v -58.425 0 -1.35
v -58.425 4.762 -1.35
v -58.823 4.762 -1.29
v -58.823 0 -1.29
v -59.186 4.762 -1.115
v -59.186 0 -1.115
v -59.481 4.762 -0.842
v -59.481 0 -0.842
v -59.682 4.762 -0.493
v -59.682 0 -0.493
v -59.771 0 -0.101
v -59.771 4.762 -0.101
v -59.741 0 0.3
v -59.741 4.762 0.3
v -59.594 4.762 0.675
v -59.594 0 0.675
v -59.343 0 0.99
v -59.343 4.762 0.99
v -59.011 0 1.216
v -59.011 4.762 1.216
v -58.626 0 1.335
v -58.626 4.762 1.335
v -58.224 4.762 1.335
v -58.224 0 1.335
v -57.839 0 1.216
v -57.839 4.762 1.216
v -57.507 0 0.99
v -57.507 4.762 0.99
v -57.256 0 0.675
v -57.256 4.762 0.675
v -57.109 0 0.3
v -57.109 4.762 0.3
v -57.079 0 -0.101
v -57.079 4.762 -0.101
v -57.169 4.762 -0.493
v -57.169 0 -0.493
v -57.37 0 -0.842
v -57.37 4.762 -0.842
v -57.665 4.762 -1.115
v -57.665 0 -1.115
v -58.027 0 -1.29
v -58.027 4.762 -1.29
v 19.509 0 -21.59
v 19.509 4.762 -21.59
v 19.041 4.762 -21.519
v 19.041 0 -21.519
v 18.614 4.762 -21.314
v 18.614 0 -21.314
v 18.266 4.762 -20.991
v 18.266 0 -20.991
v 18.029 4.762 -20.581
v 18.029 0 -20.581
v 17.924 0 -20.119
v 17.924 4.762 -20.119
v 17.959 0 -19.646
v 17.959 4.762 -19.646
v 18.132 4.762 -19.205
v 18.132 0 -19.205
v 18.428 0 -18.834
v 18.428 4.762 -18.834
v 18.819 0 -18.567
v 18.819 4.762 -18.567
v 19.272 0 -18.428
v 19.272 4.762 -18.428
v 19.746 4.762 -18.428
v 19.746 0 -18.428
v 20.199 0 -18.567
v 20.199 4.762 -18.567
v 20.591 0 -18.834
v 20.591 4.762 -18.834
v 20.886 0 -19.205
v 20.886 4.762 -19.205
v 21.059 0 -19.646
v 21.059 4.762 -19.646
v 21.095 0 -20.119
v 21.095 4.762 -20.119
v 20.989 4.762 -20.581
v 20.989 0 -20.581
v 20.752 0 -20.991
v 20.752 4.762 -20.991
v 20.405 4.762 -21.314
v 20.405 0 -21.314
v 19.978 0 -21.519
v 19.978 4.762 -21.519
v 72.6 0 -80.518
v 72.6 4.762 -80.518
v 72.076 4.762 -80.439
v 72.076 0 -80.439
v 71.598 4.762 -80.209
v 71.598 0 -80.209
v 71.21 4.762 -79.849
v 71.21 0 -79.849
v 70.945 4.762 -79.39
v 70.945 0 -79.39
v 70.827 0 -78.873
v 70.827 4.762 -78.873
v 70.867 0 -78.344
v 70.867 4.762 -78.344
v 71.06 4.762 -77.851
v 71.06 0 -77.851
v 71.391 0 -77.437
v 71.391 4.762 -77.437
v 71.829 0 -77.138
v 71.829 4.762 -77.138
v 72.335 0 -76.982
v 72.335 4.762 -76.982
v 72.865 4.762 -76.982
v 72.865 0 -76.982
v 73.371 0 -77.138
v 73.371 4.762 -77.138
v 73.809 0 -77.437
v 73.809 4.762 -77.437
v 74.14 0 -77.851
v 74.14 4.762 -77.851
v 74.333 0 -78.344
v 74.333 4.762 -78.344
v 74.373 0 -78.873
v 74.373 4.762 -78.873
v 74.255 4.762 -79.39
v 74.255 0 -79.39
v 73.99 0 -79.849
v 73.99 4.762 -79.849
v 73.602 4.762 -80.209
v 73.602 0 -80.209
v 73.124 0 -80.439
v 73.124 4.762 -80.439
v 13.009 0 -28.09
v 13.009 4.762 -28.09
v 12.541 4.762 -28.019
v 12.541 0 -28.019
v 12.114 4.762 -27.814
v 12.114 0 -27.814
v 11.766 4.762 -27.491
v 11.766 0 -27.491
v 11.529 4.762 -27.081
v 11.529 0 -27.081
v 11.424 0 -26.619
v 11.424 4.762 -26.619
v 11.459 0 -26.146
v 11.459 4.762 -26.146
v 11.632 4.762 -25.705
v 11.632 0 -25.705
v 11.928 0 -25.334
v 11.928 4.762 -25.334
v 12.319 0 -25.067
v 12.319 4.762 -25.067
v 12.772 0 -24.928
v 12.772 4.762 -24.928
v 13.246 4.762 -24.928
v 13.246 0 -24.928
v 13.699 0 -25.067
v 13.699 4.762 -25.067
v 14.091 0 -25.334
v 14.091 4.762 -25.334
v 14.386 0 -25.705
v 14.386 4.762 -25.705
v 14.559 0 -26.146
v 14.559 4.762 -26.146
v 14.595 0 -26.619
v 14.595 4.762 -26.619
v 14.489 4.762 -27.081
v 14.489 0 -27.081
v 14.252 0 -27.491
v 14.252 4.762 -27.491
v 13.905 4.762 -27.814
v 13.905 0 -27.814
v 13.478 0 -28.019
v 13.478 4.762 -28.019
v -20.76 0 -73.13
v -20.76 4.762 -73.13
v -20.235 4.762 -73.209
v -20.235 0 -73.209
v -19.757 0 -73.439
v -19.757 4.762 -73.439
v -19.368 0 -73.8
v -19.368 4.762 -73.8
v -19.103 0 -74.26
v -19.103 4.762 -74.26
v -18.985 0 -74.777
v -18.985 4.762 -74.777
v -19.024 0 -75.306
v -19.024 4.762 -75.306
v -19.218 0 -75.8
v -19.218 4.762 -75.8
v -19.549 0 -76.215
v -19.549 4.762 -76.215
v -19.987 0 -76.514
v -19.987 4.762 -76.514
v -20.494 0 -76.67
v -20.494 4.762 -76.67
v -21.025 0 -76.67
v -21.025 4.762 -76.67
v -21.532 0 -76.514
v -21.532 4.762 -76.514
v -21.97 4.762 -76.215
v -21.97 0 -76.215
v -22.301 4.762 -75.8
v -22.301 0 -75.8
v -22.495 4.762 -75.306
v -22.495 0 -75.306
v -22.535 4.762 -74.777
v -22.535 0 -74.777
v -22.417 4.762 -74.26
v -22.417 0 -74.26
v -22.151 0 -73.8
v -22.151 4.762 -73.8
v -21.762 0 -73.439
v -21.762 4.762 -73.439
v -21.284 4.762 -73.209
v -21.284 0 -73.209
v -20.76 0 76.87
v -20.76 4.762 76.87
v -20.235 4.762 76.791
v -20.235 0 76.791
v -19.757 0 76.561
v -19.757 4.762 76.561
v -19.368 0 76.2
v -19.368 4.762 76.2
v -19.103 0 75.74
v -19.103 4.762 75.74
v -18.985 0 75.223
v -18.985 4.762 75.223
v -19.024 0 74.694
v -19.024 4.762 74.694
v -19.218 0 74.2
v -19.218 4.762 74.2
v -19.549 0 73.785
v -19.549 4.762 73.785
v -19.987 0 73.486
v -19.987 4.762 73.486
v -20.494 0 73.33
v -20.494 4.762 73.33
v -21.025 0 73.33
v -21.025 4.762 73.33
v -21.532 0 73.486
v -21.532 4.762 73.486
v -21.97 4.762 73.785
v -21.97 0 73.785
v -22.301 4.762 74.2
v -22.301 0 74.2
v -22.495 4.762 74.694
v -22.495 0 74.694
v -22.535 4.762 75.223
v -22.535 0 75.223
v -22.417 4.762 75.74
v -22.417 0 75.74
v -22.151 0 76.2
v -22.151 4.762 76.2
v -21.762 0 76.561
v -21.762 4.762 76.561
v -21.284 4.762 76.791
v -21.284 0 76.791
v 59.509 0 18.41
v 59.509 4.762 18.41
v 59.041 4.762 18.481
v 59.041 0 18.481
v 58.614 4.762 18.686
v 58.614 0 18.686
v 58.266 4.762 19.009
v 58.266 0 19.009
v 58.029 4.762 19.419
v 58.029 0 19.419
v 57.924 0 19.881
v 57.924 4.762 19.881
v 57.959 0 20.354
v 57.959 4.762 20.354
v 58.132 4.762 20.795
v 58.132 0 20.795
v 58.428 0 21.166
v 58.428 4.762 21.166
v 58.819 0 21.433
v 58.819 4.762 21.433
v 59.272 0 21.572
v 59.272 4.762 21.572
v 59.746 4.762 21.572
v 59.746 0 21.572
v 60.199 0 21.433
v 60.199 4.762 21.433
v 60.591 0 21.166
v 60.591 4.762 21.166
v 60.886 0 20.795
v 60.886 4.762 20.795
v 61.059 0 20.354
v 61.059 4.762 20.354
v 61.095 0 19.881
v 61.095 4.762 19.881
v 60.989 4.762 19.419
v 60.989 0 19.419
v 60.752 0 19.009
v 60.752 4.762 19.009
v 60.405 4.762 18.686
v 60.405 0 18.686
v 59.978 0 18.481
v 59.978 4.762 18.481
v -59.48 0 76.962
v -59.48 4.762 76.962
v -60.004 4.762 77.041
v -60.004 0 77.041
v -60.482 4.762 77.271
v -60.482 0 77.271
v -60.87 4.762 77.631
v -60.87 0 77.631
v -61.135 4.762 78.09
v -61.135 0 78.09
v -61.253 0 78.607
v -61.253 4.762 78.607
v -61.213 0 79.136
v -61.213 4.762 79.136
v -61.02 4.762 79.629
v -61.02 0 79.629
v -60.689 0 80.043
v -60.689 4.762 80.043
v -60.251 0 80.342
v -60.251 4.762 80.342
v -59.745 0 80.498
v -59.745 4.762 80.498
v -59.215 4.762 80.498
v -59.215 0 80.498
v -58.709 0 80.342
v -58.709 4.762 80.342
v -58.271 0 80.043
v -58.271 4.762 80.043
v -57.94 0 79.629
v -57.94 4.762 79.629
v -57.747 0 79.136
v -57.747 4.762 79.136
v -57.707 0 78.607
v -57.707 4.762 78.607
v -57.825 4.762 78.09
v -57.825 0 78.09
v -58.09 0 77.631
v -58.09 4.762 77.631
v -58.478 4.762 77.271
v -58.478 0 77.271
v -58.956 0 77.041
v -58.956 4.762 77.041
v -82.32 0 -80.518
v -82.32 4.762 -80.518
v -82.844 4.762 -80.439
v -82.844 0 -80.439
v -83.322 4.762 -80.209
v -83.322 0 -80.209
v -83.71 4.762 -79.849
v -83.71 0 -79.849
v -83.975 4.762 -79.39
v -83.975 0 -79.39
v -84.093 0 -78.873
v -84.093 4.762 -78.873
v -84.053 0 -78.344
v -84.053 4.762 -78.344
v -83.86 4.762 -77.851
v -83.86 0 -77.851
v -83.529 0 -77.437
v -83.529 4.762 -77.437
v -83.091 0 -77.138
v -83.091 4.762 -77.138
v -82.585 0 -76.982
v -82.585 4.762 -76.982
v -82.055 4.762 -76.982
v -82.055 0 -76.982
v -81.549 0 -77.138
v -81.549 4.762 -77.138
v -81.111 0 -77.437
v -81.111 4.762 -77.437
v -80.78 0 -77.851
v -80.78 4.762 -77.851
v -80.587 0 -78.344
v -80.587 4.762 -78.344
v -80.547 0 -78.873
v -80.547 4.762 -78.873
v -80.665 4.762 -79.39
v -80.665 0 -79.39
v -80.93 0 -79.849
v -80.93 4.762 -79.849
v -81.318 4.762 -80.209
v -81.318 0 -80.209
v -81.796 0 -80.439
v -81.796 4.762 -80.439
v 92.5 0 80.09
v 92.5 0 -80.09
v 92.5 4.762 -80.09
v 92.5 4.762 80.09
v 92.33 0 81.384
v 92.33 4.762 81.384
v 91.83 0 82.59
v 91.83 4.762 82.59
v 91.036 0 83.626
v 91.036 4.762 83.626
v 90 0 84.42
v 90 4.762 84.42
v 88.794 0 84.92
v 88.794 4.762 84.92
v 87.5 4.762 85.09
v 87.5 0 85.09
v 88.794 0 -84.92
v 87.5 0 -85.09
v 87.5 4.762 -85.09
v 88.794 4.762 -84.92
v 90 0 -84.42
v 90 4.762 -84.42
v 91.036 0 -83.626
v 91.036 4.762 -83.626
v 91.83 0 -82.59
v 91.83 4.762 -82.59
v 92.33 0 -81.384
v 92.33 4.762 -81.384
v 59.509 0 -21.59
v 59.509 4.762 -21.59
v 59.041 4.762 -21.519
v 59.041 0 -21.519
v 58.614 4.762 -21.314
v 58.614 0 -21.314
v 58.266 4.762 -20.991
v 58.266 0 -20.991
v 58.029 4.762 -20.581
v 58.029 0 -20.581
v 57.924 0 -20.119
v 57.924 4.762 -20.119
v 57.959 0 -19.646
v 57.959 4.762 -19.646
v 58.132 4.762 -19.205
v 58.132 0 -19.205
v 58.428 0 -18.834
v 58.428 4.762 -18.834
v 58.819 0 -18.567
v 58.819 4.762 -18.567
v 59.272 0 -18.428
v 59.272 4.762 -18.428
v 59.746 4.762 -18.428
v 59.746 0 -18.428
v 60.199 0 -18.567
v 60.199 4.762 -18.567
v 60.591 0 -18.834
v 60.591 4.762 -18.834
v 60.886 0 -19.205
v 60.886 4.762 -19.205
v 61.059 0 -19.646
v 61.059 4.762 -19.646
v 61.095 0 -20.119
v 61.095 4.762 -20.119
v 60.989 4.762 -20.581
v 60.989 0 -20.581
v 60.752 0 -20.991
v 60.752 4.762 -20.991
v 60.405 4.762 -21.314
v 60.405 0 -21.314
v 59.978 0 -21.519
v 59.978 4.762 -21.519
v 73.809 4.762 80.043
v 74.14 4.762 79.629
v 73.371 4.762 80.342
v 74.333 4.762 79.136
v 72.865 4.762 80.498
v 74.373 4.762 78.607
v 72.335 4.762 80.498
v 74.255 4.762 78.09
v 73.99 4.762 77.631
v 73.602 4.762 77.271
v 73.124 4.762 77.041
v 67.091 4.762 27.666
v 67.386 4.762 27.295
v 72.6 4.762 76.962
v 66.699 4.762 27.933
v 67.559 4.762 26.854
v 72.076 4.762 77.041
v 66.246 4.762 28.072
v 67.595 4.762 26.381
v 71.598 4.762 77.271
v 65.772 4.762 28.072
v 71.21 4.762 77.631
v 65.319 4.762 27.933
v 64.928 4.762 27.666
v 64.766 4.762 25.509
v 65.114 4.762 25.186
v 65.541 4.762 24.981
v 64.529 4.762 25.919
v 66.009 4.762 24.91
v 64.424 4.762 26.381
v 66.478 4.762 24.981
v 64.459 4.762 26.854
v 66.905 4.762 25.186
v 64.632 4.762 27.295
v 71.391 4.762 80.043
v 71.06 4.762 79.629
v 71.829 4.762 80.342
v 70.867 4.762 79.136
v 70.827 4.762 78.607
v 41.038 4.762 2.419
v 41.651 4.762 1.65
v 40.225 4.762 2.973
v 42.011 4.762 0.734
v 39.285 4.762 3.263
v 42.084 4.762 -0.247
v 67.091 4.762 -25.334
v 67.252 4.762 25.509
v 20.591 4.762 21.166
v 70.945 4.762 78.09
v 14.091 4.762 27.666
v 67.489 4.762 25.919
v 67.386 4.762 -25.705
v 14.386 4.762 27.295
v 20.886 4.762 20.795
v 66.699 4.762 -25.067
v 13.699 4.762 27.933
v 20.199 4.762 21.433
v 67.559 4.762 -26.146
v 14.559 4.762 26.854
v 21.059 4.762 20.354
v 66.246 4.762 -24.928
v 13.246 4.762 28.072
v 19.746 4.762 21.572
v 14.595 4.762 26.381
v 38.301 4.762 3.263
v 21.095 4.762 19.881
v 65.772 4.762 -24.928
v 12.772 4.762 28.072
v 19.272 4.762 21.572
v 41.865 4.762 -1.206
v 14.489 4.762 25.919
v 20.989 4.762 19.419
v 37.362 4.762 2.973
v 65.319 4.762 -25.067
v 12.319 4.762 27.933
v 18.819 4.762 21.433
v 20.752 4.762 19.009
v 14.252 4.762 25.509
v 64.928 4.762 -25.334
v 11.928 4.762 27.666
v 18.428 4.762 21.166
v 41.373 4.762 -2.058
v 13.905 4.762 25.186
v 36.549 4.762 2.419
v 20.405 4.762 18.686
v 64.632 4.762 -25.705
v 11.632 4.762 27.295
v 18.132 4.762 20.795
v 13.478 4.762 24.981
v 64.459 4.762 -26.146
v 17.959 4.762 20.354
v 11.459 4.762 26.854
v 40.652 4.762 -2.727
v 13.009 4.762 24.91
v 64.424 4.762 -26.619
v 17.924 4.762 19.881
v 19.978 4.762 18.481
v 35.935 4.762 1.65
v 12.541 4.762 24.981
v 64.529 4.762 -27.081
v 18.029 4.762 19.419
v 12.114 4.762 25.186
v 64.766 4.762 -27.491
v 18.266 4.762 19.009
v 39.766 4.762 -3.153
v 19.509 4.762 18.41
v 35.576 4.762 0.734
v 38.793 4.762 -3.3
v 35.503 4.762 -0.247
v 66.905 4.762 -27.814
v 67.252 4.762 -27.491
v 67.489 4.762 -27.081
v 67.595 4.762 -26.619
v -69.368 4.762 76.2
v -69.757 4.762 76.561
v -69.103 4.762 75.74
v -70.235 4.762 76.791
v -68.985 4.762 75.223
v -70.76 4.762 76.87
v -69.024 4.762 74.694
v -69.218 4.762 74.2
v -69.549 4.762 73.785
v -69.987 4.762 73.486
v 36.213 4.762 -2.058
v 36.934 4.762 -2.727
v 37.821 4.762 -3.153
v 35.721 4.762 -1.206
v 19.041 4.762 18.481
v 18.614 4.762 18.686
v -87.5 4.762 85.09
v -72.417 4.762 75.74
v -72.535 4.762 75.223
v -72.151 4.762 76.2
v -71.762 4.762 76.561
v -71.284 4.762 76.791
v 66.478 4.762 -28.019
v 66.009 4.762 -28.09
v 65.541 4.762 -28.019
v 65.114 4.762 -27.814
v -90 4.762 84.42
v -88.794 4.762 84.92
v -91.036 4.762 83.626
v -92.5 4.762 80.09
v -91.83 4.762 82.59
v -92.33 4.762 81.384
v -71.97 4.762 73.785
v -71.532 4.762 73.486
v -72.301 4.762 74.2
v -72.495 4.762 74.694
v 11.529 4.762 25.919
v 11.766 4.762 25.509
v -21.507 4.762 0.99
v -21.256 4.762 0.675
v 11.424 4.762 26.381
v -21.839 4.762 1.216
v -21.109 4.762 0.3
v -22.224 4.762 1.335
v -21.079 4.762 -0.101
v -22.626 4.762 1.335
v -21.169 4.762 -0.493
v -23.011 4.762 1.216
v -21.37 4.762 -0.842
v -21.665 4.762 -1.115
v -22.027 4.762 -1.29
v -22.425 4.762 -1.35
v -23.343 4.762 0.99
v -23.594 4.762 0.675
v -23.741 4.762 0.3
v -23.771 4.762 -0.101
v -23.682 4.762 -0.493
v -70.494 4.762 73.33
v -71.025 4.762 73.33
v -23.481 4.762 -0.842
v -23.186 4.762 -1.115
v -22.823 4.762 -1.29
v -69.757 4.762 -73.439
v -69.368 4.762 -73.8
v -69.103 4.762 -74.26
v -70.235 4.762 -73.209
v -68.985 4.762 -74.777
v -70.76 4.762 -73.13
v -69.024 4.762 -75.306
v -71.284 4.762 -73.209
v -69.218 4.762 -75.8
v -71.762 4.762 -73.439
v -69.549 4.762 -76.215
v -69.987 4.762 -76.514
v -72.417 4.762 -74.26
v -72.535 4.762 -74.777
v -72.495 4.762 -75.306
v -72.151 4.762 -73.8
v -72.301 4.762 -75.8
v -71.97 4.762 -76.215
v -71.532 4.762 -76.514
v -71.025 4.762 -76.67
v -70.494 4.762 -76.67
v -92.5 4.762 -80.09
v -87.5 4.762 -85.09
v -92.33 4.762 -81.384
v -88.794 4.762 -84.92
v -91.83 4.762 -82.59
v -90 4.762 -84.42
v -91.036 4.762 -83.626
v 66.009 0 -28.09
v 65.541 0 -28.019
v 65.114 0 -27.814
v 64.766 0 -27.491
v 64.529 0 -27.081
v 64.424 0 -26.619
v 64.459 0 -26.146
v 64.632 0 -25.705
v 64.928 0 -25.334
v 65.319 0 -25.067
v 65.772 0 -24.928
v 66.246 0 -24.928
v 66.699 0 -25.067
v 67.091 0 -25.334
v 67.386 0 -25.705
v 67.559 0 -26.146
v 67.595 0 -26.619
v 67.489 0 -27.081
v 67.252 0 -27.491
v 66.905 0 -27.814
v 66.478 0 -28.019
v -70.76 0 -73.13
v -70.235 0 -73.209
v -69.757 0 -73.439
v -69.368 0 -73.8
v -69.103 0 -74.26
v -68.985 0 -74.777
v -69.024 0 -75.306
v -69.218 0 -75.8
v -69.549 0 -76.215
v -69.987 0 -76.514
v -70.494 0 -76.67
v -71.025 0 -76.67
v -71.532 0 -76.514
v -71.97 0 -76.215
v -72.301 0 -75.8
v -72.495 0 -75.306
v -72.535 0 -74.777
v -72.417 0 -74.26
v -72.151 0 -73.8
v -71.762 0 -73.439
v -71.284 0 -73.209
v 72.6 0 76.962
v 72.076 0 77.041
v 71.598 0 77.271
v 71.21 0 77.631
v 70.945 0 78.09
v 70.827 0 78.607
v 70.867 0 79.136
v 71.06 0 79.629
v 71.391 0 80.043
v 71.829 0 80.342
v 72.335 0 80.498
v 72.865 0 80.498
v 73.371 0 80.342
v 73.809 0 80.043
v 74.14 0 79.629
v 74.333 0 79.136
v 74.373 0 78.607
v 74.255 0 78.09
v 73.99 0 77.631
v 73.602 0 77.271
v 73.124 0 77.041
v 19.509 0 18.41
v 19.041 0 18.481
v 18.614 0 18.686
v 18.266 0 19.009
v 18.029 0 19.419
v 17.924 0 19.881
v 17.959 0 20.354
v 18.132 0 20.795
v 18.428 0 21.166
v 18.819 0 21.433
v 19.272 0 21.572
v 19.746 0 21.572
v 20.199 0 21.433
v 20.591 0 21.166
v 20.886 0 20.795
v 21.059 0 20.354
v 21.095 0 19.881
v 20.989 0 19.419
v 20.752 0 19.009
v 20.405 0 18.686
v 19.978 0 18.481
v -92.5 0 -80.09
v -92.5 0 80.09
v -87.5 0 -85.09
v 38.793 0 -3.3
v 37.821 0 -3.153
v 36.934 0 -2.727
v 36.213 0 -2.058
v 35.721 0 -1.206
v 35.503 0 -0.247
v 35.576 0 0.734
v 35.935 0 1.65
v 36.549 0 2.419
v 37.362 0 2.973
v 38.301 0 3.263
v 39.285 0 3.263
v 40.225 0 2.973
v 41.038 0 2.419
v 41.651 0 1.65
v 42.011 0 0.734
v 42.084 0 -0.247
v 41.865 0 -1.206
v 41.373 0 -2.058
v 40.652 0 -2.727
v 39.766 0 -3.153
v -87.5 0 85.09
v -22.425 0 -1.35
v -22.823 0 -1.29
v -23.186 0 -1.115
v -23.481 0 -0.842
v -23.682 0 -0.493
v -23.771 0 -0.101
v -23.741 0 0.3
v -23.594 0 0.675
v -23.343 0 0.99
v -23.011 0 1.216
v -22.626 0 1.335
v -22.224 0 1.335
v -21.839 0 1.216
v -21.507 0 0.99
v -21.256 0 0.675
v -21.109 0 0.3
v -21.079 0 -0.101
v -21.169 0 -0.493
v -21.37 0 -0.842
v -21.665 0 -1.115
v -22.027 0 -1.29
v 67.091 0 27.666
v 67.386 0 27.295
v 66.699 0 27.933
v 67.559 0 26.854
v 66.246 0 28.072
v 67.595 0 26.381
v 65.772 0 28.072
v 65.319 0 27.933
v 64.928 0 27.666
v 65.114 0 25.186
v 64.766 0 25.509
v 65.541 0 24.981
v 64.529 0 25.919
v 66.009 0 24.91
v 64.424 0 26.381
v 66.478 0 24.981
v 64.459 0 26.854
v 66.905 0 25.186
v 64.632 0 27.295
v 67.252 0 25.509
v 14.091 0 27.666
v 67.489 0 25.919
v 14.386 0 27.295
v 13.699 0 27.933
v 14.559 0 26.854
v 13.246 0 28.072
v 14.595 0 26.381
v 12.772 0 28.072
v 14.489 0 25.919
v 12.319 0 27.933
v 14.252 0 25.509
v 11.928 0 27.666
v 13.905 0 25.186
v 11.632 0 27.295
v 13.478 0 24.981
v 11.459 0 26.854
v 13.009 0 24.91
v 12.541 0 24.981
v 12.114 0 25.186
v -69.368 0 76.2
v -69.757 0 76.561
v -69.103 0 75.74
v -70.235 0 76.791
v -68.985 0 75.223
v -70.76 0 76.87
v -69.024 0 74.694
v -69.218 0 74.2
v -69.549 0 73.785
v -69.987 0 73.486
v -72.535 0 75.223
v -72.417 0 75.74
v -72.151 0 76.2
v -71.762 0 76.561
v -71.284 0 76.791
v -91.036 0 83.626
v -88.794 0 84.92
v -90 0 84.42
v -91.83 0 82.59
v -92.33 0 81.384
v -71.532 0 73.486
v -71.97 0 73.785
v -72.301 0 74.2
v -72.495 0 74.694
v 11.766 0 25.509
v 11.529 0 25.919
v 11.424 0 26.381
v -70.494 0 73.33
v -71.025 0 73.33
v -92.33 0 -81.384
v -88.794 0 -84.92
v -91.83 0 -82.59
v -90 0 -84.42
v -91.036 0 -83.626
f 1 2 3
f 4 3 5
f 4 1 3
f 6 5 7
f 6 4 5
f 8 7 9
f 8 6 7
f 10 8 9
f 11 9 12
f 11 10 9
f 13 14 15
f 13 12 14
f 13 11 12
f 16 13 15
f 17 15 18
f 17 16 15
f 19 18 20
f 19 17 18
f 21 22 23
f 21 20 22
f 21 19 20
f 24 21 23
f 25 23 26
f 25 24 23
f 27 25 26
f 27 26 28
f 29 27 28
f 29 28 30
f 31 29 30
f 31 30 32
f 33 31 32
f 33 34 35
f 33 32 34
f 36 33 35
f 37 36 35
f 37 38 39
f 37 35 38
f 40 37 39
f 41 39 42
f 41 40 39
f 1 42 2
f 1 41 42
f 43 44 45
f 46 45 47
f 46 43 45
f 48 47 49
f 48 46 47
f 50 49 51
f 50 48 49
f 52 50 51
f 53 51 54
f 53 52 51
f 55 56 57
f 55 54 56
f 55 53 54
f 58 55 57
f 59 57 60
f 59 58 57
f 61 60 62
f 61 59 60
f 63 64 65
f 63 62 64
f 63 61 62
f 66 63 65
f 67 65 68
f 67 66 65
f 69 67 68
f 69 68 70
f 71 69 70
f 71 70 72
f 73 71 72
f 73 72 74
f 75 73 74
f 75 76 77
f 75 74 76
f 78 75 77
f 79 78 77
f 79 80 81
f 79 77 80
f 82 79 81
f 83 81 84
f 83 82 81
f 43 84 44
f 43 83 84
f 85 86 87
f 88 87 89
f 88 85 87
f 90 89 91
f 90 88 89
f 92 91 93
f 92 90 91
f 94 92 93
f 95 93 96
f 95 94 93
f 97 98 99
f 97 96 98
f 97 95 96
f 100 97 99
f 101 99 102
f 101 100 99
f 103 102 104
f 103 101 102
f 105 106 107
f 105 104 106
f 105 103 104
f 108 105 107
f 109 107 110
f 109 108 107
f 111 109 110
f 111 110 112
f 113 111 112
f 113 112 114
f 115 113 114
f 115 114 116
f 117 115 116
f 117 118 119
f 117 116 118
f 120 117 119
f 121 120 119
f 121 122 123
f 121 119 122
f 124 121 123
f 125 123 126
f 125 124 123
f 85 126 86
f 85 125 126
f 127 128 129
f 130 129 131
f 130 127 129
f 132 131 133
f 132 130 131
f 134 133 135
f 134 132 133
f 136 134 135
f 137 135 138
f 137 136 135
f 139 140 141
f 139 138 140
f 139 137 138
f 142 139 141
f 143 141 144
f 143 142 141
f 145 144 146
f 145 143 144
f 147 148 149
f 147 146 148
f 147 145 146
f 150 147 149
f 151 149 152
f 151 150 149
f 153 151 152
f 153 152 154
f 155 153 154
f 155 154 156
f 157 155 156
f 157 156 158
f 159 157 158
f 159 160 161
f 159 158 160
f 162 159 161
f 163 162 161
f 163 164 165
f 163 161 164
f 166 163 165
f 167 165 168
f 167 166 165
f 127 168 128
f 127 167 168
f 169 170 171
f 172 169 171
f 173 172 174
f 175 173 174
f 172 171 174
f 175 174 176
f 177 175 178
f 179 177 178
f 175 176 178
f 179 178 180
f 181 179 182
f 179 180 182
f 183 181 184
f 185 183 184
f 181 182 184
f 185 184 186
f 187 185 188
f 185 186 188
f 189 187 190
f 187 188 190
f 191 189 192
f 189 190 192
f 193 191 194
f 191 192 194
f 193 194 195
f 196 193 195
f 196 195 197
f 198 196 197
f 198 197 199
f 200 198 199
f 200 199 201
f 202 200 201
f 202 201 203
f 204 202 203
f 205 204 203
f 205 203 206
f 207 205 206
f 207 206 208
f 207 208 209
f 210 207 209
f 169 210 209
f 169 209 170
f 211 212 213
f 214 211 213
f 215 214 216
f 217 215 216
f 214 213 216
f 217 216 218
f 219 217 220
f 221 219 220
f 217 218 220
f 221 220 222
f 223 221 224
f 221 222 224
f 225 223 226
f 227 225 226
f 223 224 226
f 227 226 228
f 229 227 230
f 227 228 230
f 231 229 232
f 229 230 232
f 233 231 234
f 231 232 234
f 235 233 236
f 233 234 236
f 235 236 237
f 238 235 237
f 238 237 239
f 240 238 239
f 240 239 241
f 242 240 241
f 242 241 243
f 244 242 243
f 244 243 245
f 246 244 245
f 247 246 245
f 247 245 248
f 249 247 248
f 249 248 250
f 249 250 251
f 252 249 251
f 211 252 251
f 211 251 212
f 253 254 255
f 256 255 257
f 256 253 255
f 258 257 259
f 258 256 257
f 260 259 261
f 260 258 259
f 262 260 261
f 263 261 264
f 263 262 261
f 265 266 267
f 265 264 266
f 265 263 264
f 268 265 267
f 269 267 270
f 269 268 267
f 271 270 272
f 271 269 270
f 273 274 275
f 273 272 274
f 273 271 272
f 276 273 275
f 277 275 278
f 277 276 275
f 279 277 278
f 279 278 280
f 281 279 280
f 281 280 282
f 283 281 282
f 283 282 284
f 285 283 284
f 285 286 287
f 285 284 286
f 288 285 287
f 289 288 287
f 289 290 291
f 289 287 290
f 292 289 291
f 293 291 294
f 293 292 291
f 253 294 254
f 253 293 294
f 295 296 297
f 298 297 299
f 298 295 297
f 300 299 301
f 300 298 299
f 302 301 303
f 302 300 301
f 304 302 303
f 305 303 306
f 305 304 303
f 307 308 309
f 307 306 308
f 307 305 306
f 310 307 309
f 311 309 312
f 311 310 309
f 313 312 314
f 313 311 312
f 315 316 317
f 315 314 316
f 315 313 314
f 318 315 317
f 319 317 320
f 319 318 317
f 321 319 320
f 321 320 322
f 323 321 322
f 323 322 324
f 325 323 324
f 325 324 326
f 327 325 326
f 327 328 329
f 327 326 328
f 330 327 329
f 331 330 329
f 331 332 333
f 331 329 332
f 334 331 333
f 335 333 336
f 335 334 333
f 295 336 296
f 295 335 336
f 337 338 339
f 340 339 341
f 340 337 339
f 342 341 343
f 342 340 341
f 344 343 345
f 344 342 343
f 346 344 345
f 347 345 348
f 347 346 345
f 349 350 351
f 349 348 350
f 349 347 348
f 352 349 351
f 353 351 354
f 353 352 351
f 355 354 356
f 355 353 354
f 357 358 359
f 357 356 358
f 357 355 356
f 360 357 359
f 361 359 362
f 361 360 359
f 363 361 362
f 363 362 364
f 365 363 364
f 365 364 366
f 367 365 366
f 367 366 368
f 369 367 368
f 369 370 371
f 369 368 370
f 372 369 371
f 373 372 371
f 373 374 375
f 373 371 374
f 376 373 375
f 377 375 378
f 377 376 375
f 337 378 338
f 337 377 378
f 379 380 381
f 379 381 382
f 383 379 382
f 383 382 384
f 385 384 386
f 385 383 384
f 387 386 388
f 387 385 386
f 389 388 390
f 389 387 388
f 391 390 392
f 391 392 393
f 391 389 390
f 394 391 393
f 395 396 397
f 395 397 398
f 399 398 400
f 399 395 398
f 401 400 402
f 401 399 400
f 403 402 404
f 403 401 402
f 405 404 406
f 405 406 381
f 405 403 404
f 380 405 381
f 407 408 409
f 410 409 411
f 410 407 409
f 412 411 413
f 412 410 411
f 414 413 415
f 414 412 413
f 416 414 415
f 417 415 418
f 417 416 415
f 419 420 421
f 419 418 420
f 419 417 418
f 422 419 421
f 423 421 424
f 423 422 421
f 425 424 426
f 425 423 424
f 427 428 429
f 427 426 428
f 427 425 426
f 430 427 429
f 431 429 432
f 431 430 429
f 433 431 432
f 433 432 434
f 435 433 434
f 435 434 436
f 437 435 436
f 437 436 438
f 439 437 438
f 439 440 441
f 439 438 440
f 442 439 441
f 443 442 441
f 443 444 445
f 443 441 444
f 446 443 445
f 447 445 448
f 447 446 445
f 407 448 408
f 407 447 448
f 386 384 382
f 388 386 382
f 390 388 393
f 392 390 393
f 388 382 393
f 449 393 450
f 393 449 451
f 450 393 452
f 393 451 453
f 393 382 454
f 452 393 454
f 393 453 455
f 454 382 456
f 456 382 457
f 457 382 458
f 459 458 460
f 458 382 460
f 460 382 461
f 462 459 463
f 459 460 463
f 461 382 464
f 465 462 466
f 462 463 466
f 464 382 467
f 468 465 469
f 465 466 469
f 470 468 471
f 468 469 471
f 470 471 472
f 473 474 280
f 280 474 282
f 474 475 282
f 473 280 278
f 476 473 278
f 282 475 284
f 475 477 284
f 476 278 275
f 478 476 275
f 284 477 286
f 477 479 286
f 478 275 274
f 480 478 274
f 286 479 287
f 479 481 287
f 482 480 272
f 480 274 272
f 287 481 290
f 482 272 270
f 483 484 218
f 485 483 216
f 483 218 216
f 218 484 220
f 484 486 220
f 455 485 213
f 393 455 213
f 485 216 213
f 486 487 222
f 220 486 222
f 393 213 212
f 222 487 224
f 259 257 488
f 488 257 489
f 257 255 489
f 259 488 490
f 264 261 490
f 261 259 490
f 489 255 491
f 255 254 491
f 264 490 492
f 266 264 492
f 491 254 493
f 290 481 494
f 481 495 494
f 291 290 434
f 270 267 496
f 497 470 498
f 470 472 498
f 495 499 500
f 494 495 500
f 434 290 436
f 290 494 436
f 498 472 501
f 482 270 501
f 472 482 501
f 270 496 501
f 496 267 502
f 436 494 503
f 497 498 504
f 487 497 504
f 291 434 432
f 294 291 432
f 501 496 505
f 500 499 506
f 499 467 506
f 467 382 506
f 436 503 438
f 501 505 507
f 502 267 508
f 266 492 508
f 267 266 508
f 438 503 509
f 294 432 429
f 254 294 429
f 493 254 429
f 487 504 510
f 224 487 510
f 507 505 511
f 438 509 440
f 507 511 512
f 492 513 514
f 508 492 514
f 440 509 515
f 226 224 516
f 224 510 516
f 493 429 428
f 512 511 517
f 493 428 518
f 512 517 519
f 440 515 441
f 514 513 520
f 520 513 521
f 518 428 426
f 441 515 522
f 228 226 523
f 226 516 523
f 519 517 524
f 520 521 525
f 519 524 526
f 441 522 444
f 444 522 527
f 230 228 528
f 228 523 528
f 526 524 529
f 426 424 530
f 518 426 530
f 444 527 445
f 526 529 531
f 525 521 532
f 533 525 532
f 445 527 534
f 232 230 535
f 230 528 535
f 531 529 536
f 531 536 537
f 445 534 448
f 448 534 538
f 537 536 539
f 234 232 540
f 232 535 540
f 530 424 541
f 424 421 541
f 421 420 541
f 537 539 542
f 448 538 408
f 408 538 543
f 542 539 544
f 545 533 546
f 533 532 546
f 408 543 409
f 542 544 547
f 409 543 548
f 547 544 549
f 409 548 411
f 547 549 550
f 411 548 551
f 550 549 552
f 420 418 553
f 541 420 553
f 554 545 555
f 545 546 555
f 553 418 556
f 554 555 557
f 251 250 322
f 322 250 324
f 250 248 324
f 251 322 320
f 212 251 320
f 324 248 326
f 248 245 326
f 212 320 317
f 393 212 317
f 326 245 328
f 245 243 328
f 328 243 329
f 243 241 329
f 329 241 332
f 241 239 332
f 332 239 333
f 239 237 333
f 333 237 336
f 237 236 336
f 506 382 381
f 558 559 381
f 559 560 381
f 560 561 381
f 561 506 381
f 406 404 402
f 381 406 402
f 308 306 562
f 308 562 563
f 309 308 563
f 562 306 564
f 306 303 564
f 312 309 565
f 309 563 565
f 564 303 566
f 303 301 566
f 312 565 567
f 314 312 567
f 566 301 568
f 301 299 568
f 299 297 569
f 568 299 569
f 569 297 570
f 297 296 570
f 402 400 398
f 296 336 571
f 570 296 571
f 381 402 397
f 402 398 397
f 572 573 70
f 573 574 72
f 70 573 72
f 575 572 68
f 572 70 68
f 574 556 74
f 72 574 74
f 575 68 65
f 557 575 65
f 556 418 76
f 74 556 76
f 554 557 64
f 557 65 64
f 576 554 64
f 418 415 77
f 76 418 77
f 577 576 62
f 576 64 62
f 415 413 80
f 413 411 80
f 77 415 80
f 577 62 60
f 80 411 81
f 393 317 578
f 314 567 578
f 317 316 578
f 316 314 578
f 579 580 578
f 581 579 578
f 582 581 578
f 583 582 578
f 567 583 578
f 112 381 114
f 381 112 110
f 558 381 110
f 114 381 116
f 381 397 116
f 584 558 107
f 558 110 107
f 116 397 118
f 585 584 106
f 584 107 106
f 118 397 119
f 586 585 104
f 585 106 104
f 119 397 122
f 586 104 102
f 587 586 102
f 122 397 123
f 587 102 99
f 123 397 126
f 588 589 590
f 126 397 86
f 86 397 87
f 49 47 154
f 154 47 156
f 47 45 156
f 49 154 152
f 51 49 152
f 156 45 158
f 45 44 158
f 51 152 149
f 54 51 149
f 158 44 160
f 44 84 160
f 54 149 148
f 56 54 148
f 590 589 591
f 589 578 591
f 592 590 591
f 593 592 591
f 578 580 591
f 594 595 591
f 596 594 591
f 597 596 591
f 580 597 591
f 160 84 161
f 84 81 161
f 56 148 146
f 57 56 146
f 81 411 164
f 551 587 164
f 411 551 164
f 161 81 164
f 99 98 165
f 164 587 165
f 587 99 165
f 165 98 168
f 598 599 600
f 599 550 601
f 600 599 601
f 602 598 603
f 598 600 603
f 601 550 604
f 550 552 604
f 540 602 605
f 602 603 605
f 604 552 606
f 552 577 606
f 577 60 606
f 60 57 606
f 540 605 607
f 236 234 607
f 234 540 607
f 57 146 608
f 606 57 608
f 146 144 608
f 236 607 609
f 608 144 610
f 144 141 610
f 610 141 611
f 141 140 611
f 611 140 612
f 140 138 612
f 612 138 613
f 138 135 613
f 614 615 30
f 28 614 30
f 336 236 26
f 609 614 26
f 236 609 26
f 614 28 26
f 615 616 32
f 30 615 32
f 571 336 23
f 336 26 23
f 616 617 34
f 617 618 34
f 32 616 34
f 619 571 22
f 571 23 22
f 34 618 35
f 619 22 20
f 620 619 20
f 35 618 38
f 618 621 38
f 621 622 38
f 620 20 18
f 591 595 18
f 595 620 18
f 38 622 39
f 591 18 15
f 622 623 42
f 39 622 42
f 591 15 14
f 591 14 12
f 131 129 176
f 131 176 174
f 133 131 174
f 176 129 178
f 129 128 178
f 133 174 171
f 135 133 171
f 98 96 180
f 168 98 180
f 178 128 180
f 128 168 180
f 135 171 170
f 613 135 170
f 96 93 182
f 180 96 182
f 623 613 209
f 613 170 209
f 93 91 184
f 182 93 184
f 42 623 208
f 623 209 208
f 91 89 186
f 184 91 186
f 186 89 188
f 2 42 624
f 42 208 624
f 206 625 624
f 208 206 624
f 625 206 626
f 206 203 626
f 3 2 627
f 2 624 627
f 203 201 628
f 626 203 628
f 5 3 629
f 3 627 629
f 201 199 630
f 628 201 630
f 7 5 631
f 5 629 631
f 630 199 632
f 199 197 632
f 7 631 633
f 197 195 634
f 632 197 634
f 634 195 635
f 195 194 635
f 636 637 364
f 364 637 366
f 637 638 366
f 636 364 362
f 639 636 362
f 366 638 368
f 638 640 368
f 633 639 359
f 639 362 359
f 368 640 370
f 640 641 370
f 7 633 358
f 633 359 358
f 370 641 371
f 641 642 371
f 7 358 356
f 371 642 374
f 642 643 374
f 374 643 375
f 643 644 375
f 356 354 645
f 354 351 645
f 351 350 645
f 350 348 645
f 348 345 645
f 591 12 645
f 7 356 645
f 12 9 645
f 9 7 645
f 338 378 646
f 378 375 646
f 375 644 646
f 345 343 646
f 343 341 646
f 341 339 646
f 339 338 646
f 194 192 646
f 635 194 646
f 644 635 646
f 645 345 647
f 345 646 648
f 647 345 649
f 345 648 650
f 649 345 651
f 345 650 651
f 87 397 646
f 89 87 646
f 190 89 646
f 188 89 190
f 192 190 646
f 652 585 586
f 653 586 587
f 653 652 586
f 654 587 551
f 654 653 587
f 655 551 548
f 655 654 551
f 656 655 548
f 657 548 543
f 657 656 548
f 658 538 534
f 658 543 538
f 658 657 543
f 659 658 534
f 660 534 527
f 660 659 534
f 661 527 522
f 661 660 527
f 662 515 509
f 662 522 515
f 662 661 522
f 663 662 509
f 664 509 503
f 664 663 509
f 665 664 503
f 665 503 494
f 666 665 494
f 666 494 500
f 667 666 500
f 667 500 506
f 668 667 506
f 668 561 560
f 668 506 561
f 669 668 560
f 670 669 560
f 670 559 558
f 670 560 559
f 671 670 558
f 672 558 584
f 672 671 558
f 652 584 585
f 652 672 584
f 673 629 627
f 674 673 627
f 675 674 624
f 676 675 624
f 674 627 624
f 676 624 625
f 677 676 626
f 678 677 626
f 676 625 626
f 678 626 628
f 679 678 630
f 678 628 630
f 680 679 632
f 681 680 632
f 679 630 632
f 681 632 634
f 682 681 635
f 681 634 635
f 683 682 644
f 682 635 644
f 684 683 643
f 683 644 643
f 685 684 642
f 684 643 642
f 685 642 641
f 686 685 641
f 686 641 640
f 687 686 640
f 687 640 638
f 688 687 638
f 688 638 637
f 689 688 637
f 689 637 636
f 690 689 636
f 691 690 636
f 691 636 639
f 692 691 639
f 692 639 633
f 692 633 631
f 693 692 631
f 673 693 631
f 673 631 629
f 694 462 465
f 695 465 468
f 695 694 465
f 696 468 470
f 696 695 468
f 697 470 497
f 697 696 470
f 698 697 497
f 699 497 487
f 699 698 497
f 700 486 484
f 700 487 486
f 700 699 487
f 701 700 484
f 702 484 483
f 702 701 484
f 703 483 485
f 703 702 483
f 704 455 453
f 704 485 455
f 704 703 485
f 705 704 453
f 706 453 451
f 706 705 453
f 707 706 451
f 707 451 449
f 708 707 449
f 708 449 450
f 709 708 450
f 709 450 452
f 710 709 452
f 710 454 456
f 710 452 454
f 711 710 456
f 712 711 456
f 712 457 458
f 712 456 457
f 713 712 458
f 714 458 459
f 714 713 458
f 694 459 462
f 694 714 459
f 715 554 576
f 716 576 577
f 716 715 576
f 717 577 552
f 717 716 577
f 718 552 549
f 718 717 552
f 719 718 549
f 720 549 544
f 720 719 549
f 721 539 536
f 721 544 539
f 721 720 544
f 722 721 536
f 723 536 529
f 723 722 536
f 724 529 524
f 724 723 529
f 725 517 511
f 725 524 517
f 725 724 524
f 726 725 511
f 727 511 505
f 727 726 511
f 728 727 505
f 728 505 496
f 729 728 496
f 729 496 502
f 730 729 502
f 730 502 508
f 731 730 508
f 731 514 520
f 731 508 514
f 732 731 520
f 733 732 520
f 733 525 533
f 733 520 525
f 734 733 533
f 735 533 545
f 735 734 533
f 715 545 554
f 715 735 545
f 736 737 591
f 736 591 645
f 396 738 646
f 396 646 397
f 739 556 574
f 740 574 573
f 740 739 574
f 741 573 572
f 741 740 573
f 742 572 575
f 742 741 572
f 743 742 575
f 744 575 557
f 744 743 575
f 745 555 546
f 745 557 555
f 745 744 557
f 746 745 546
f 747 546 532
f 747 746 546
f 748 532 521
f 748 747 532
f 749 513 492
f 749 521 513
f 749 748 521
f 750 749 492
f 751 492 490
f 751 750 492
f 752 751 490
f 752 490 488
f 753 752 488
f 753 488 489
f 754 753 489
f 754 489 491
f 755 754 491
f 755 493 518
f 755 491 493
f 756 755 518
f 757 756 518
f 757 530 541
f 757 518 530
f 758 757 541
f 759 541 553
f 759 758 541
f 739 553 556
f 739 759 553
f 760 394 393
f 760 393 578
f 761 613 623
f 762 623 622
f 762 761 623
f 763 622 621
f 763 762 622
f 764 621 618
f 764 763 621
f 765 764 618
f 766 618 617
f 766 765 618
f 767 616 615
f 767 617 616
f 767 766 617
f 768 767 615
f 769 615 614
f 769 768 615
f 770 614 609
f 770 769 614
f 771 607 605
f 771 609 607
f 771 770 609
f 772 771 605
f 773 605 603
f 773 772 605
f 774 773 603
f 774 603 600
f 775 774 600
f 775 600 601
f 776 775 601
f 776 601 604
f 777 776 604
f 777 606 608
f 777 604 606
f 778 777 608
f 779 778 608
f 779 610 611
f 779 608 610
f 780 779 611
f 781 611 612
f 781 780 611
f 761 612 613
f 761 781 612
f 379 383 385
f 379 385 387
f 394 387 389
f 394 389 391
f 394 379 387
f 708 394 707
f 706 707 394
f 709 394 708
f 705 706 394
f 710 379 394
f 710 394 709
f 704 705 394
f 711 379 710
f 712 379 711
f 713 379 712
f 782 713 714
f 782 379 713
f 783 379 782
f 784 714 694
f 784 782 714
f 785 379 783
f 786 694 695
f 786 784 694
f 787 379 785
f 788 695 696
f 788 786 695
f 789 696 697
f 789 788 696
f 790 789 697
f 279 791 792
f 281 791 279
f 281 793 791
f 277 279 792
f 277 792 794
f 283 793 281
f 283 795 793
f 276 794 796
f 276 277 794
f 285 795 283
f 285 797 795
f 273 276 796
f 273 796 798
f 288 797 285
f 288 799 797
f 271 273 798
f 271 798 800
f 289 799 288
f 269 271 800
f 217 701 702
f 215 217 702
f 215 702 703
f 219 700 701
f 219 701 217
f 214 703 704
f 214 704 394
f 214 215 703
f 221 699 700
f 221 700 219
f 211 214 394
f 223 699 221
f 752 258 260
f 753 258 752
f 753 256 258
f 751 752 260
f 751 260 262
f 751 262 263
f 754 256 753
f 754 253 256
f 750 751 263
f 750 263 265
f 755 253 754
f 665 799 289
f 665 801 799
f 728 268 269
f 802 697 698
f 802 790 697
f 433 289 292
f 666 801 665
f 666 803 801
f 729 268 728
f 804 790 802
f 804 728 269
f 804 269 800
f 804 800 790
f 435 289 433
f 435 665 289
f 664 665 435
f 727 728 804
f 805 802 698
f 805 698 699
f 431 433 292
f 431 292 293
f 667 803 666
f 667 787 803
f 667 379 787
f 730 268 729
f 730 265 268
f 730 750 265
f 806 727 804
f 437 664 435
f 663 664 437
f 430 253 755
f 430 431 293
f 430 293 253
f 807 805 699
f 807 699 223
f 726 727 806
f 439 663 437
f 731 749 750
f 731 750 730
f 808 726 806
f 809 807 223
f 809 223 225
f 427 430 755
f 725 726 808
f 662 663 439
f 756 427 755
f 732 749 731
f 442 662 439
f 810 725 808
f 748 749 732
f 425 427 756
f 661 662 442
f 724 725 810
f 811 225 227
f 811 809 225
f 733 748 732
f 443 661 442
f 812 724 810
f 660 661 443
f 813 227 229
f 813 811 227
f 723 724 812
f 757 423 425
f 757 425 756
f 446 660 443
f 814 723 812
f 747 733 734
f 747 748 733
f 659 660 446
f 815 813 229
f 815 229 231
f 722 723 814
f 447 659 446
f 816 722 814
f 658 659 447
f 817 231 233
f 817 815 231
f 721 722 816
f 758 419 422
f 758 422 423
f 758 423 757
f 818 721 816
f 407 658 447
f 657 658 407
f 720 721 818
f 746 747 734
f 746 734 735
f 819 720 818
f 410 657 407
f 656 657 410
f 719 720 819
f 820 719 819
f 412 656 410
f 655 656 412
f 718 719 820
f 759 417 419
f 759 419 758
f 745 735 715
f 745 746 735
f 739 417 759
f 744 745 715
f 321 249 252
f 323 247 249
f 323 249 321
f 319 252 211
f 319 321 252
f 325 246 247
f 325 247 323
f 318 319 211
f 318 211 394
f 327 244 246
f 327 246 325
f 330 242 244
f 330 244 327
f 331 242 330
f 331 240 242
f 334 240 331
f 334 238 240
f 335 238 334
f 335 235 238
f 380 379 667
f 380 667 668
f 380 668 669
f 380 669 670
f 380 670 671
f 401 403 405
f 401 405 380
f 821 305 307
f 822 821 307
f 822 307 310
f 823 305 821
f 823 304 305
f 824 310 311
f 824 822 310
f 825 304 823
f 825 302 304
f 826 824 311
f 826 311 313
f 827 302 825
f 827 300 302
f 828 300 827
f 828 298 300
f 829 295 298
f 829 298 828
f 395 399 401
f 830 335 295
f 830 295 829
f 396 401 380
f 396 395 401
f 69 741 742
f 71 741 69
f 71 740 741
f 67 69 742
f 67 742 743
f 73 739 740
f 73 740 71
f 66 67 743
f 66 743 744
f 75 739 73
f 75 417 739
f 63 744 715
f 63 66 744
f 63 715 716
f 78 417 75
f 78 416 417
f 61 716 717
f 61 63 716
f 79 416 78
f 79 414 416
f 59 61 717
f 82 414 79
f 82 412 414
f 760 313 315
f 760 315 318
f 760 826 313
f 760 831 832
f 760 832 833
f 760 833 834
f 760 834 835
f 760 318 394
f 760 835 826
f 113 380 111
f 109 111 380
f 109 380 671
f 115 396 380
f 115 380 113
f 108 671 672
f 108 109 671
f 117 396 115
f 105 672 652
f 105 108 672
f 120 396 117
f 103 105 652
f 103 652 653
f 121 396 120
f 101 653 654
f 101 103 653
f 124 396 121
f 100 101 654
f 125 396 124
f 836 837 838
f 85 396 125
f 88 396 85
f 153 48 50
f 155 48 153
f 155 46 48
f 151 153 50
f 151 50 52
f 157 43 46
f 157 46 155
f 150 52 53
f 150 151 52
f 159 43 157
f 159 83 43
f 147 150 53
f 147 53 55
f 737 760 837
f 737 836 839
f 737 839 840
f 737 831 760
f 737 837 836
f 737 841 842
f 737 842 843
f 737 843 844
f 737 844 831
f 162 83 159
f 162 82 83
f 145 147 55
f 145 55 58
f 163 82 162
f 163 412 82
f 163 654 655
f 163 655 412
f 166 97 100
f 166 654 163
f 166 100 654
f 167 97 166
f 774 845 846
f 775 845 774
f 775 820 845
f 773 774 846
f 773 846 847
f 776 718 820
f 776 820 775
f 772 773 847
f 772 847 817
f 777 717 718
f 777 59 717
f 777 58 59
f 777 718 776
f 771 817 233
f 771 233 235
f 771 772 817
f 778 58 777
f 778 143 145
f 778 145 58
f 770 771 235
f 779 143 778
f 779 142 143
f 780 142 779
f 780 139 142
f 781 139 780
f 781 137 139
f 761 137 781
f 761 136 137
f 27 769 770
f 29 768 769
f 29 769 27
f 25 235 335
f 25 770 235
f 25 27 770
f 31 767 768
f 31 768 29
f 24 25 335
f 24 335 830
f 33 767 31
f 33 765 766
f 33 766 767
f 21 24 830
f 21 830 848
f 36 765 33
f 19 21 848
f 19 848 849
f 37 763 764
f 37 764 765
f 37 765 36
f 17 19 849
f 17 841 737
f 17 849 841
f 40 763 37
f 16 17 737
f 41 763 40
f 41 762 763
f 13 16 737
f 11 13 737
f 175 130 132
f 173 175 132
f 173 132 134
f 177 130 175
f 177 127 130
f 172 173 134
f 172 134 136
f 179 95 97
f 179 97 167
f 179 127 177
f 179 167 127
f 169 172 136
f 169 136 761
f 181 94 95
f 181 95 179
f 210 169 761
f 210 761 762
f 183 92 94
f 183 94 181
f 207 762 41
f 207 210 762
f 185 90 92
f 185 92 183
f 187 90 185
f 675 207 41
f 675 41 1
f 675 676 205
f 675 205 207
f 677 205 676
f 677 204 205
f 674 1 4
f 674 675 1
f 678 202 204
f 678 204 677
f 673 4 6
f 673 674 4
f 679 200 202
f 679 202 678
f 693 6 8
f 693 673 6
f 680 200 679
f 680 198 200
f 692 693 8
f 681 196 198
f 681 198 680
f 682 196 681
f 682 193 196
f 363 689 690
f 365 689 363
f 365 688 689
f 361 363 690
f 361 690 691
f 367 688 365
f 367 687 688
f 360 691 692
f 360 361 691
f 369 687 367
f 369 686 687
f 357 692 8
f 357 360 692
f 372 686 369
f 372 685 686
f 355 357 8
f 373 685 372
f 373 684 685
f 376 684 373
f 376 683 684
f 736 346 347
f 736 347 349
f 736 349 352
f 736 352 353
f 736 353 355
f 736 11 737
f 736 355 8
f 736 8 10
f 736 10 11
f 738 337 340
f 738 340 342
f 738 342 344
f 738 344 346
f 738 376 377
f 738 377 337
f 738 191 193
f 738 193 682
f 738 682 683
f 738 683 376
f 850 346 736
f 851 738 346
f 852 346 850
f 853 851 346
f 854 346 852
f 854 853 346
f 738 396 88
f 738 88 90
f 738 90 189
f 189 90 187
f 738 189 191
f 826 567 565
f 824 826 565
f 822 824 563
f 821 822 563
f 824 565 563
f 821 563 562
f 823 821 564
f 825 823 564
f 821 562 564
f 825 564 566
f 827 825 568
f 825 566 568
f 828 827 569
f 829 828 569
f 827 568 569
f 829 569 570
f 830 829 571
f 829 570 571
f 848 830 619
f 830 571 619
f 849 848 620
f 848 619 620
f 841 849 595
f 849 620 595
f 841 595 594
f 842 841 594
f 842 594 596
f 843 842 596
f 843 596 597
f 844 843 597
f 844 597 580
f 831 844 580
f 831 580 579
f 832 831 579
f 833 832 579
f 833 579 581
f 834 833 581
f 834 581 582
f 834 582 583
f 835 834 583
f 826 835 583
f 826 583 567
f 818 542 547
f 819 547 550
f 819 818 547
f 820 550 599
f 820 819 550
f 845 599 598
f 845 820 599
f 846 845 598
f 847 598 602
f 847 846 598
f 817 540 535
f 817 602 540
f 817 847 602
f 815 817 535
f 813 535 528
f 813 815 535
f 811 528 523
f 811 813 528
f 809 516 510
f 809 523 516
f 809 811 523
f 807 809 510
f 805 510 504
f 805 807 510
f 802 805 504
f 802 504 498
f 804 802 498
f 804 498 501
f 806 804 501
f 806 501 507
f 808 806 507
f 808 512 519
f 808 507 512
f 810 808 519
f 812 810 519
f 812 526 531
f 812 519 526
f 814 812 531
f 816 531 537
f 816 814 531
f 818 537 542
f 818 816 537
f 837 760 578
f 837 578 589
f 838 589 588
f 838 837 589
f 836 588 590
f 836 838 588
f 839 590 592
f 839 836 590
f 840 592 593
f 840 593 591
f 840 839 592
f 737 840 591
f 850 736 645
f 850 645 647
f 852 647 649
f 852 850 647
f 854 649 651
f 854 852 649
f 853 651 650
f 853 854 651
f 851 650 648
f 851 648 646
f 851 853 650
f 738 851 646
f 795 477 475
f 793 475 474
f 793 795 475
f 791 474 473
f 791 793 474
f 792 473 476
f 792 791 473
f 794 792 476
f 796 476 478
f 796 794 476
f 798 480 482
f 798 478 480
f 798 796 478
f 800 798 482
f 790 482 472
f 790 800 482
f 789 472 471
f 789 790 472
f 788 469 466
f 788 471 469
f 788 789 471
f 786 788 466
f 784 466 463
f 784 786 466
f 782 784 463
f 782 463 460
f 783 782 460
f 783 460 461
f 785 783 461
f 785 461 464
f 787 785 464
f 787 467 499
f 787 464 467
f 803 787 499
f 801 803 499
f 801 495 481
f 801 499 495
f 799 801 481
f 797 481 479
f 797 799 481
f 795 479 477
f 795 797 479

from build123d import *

# Parameters (mm, degrees)
BOSS_EXTRUDE1_DEPTH  = 4.7625
SKETCH4_R            = 1.778
JETSON_DEPTH         = 126.774558263
SKETCH3_R            = 1.35
VMU931_DEPTH         = 126.774558263
SKETCH6_R            = 1.59
LIDAR_URG_UST_DEPTH  = 126.774558263
SKETCH7_R            = 1.59
LIDAR_UTM_DEPTH      = 126.774558263
SKETCH9_R            = 3.3
LIDAR_VELODYNE_DEPTH = 126.774558263
SKETCH10_R           = 1.78
CUT_EXTRUDE5_DEPTH   = 126.774558263


with BuildPart() as part:
    # Sketch1 → Boss-Extrude1 (new body)
    with BuildSketch(Plane(origin=(0, 0, 0), x_dir=(1, 0, 0), z_dir=(0, 1, 0))):
        with BuildLine():
            Line((-87.5, 85.09), (87.5, 85.09))
            ThreePointArc((87.5, 85.09), (91.035533906, 83.625533906), (92.5, 80.09))
            Line((92.5, 80.09), (92.5, -80.09))
            ThreePointArc((92.5, -80.09), (91.035533906, -83.625533906), (87.5, -85.09))
            Line((87.5, -85.09), (-87.5, -85.09))
            ThreePointArc((-87.5, -85.09), (-91.035533906, -83.625533906), (-92.5, -80.09))
            Line((-92.5, -80.09), (-92.5, 80.09))
            ThreePointArc((-92.5, 80.09), (-91.035533906, 83.625533906), (-87.5, 85.09))
        make_face()
    extrude(amount=BOSS_EXTRUDE1_DEPTH)

    # Sketch4 → jetson (cut, through all)
    with BuildSketch(Plane(origin=(0, 0, 0), x_dir=(1, 0, 0), z_dir=(0, 1, 0))):
        with Locations(Location((-59.48, -78.74, 0), (0, 0, 90))):
            Circle(SKETCH4_R)
        with Locations(Location((-82.32, 78.74, 0), (0, 0, 90))):
            Circle(SKETCH4_R)
        with Locations(Location((72.6, 78.74, 0), (0, 0, 90))):
            Circle(SKETCH4_R)
        with Locations(Location((72.6, -78.74, 0), (0, 0, 90))):
            Circle(SKETCH4_R)
    extrude(amount=JETSON_DEPTH, mode=Mode.SUBTRACT)

    # Sketch3 → vmu931 (cut, through all)
    with BuildSketch(Plane(origin=(0, 0, 0), x_dir=(1, 0, 0), z_dir=(0, 1, 0))):
        with Locations(Location((-22.425235734, 0, 0), (0, 0, 90))):
            Circle(SKETCH3_R)
        with Locations(Location((-58.425235734, 0, 0), (0, 0, 90))):
            Circle(SKETCH3_R)
    extrude(amount=VMU931_DEPTH, mode=Mode.SUBTRACT)

    # Sketch6 → lidar urg/ust (cut, through all)
    with BuildSketch(Plane(origin=(0, 0, 0), x_dir=(1, 0, 0), z_dir=(0, 1, 0))):
        with Locations(Location((59.509273414, 20, 0), (0, 0, 90))):
            Circle(SKETCH6_R)
        with Locations(Location((59.509273414, -20, 0), (0, 0, 90))):
            Circle(SKETCH6_R)
        with Locations(Location((19.509273414, -20, 0), (0, 0, 90))):
            Circle(SKETCH6_R)
        with Locations(Location((19.509273414, 20, 0), (0, 0, 90))):
            Circle(SKETCH6_R)
    extrude(amount=LIDAR_URG_UST_DEPTH, mode=Mode.SUBTRACT)

    # Sketch7 → lidar utm (cut, through all)
    with BuildSketch(Plane(origin=(0, 0, 0), x_dir=(1, 0, 0), z_dir=(0, 1, 0))):
        with Locations(Location((13.009273414, 26.5, 0), (0, 0, 90))):
            Circle(SKETCH7_R)
        with Locations(Location((13.009273414, -26.5, 0), (0, 0, 90))):
            Circle(SKETCH7_R)
        with Locations(Location((66.009273414, -26.5, 0), (0, 0, 90))):
            Circle(SKETCH7_R)
        with Locations(Location((66.009273414, 26.5, 0), (0, 0, 90))):
            Circle(SKETCH7_R)
    extrude(amount=LIDAR_UTM_DEPTH, mode=Mode.SUBTRACT)

    # Sketch9 → lidar velodyne (cut, through all)
    with BuildSketch(Plane(origin=(0, 0, 0), x_dir=(1, 0, 0), z_dir=(0, 1, 0))):
        with Locations(Location((38.793326615, 0, 0), (0, 0, 90))):
            Circle(SKETCH9_R)
    extrude(amount=LIDAR_VELODYNE_DEPTH, mode=Mode.SUBTRACT)

    # Sketch10 → Cut-Extrude5 (cut, through all)
    with BuildSketch(Plane(origin=(0, 4.7625, 0), x_dir=(1, 0, 0), z_dir=(0, 1, 0))):
        with Locations(Location((-70.759751839, 74.91, 0), (0, 0, 270))):
            Circle(SKETCH10_R)
        with Locations(Location((-20.759751839, 74.91, 0), (0, 0, 270))):
            Circle(SKETCH10_R)
        with Locations(Location((-70.759751839, -75.09, 0), (0, 0, 270))):
            Circle(SKETCH10_R)
        with Locations(Location((-20.759751839, -75.09, 0), (0, 0, 270))):
            Circle(SKETCH10_R)
    extrude(amount=-CUT_EXTRUDE5_DEPTH, mode=Mode.SUBTRACT)


solid = part.part
